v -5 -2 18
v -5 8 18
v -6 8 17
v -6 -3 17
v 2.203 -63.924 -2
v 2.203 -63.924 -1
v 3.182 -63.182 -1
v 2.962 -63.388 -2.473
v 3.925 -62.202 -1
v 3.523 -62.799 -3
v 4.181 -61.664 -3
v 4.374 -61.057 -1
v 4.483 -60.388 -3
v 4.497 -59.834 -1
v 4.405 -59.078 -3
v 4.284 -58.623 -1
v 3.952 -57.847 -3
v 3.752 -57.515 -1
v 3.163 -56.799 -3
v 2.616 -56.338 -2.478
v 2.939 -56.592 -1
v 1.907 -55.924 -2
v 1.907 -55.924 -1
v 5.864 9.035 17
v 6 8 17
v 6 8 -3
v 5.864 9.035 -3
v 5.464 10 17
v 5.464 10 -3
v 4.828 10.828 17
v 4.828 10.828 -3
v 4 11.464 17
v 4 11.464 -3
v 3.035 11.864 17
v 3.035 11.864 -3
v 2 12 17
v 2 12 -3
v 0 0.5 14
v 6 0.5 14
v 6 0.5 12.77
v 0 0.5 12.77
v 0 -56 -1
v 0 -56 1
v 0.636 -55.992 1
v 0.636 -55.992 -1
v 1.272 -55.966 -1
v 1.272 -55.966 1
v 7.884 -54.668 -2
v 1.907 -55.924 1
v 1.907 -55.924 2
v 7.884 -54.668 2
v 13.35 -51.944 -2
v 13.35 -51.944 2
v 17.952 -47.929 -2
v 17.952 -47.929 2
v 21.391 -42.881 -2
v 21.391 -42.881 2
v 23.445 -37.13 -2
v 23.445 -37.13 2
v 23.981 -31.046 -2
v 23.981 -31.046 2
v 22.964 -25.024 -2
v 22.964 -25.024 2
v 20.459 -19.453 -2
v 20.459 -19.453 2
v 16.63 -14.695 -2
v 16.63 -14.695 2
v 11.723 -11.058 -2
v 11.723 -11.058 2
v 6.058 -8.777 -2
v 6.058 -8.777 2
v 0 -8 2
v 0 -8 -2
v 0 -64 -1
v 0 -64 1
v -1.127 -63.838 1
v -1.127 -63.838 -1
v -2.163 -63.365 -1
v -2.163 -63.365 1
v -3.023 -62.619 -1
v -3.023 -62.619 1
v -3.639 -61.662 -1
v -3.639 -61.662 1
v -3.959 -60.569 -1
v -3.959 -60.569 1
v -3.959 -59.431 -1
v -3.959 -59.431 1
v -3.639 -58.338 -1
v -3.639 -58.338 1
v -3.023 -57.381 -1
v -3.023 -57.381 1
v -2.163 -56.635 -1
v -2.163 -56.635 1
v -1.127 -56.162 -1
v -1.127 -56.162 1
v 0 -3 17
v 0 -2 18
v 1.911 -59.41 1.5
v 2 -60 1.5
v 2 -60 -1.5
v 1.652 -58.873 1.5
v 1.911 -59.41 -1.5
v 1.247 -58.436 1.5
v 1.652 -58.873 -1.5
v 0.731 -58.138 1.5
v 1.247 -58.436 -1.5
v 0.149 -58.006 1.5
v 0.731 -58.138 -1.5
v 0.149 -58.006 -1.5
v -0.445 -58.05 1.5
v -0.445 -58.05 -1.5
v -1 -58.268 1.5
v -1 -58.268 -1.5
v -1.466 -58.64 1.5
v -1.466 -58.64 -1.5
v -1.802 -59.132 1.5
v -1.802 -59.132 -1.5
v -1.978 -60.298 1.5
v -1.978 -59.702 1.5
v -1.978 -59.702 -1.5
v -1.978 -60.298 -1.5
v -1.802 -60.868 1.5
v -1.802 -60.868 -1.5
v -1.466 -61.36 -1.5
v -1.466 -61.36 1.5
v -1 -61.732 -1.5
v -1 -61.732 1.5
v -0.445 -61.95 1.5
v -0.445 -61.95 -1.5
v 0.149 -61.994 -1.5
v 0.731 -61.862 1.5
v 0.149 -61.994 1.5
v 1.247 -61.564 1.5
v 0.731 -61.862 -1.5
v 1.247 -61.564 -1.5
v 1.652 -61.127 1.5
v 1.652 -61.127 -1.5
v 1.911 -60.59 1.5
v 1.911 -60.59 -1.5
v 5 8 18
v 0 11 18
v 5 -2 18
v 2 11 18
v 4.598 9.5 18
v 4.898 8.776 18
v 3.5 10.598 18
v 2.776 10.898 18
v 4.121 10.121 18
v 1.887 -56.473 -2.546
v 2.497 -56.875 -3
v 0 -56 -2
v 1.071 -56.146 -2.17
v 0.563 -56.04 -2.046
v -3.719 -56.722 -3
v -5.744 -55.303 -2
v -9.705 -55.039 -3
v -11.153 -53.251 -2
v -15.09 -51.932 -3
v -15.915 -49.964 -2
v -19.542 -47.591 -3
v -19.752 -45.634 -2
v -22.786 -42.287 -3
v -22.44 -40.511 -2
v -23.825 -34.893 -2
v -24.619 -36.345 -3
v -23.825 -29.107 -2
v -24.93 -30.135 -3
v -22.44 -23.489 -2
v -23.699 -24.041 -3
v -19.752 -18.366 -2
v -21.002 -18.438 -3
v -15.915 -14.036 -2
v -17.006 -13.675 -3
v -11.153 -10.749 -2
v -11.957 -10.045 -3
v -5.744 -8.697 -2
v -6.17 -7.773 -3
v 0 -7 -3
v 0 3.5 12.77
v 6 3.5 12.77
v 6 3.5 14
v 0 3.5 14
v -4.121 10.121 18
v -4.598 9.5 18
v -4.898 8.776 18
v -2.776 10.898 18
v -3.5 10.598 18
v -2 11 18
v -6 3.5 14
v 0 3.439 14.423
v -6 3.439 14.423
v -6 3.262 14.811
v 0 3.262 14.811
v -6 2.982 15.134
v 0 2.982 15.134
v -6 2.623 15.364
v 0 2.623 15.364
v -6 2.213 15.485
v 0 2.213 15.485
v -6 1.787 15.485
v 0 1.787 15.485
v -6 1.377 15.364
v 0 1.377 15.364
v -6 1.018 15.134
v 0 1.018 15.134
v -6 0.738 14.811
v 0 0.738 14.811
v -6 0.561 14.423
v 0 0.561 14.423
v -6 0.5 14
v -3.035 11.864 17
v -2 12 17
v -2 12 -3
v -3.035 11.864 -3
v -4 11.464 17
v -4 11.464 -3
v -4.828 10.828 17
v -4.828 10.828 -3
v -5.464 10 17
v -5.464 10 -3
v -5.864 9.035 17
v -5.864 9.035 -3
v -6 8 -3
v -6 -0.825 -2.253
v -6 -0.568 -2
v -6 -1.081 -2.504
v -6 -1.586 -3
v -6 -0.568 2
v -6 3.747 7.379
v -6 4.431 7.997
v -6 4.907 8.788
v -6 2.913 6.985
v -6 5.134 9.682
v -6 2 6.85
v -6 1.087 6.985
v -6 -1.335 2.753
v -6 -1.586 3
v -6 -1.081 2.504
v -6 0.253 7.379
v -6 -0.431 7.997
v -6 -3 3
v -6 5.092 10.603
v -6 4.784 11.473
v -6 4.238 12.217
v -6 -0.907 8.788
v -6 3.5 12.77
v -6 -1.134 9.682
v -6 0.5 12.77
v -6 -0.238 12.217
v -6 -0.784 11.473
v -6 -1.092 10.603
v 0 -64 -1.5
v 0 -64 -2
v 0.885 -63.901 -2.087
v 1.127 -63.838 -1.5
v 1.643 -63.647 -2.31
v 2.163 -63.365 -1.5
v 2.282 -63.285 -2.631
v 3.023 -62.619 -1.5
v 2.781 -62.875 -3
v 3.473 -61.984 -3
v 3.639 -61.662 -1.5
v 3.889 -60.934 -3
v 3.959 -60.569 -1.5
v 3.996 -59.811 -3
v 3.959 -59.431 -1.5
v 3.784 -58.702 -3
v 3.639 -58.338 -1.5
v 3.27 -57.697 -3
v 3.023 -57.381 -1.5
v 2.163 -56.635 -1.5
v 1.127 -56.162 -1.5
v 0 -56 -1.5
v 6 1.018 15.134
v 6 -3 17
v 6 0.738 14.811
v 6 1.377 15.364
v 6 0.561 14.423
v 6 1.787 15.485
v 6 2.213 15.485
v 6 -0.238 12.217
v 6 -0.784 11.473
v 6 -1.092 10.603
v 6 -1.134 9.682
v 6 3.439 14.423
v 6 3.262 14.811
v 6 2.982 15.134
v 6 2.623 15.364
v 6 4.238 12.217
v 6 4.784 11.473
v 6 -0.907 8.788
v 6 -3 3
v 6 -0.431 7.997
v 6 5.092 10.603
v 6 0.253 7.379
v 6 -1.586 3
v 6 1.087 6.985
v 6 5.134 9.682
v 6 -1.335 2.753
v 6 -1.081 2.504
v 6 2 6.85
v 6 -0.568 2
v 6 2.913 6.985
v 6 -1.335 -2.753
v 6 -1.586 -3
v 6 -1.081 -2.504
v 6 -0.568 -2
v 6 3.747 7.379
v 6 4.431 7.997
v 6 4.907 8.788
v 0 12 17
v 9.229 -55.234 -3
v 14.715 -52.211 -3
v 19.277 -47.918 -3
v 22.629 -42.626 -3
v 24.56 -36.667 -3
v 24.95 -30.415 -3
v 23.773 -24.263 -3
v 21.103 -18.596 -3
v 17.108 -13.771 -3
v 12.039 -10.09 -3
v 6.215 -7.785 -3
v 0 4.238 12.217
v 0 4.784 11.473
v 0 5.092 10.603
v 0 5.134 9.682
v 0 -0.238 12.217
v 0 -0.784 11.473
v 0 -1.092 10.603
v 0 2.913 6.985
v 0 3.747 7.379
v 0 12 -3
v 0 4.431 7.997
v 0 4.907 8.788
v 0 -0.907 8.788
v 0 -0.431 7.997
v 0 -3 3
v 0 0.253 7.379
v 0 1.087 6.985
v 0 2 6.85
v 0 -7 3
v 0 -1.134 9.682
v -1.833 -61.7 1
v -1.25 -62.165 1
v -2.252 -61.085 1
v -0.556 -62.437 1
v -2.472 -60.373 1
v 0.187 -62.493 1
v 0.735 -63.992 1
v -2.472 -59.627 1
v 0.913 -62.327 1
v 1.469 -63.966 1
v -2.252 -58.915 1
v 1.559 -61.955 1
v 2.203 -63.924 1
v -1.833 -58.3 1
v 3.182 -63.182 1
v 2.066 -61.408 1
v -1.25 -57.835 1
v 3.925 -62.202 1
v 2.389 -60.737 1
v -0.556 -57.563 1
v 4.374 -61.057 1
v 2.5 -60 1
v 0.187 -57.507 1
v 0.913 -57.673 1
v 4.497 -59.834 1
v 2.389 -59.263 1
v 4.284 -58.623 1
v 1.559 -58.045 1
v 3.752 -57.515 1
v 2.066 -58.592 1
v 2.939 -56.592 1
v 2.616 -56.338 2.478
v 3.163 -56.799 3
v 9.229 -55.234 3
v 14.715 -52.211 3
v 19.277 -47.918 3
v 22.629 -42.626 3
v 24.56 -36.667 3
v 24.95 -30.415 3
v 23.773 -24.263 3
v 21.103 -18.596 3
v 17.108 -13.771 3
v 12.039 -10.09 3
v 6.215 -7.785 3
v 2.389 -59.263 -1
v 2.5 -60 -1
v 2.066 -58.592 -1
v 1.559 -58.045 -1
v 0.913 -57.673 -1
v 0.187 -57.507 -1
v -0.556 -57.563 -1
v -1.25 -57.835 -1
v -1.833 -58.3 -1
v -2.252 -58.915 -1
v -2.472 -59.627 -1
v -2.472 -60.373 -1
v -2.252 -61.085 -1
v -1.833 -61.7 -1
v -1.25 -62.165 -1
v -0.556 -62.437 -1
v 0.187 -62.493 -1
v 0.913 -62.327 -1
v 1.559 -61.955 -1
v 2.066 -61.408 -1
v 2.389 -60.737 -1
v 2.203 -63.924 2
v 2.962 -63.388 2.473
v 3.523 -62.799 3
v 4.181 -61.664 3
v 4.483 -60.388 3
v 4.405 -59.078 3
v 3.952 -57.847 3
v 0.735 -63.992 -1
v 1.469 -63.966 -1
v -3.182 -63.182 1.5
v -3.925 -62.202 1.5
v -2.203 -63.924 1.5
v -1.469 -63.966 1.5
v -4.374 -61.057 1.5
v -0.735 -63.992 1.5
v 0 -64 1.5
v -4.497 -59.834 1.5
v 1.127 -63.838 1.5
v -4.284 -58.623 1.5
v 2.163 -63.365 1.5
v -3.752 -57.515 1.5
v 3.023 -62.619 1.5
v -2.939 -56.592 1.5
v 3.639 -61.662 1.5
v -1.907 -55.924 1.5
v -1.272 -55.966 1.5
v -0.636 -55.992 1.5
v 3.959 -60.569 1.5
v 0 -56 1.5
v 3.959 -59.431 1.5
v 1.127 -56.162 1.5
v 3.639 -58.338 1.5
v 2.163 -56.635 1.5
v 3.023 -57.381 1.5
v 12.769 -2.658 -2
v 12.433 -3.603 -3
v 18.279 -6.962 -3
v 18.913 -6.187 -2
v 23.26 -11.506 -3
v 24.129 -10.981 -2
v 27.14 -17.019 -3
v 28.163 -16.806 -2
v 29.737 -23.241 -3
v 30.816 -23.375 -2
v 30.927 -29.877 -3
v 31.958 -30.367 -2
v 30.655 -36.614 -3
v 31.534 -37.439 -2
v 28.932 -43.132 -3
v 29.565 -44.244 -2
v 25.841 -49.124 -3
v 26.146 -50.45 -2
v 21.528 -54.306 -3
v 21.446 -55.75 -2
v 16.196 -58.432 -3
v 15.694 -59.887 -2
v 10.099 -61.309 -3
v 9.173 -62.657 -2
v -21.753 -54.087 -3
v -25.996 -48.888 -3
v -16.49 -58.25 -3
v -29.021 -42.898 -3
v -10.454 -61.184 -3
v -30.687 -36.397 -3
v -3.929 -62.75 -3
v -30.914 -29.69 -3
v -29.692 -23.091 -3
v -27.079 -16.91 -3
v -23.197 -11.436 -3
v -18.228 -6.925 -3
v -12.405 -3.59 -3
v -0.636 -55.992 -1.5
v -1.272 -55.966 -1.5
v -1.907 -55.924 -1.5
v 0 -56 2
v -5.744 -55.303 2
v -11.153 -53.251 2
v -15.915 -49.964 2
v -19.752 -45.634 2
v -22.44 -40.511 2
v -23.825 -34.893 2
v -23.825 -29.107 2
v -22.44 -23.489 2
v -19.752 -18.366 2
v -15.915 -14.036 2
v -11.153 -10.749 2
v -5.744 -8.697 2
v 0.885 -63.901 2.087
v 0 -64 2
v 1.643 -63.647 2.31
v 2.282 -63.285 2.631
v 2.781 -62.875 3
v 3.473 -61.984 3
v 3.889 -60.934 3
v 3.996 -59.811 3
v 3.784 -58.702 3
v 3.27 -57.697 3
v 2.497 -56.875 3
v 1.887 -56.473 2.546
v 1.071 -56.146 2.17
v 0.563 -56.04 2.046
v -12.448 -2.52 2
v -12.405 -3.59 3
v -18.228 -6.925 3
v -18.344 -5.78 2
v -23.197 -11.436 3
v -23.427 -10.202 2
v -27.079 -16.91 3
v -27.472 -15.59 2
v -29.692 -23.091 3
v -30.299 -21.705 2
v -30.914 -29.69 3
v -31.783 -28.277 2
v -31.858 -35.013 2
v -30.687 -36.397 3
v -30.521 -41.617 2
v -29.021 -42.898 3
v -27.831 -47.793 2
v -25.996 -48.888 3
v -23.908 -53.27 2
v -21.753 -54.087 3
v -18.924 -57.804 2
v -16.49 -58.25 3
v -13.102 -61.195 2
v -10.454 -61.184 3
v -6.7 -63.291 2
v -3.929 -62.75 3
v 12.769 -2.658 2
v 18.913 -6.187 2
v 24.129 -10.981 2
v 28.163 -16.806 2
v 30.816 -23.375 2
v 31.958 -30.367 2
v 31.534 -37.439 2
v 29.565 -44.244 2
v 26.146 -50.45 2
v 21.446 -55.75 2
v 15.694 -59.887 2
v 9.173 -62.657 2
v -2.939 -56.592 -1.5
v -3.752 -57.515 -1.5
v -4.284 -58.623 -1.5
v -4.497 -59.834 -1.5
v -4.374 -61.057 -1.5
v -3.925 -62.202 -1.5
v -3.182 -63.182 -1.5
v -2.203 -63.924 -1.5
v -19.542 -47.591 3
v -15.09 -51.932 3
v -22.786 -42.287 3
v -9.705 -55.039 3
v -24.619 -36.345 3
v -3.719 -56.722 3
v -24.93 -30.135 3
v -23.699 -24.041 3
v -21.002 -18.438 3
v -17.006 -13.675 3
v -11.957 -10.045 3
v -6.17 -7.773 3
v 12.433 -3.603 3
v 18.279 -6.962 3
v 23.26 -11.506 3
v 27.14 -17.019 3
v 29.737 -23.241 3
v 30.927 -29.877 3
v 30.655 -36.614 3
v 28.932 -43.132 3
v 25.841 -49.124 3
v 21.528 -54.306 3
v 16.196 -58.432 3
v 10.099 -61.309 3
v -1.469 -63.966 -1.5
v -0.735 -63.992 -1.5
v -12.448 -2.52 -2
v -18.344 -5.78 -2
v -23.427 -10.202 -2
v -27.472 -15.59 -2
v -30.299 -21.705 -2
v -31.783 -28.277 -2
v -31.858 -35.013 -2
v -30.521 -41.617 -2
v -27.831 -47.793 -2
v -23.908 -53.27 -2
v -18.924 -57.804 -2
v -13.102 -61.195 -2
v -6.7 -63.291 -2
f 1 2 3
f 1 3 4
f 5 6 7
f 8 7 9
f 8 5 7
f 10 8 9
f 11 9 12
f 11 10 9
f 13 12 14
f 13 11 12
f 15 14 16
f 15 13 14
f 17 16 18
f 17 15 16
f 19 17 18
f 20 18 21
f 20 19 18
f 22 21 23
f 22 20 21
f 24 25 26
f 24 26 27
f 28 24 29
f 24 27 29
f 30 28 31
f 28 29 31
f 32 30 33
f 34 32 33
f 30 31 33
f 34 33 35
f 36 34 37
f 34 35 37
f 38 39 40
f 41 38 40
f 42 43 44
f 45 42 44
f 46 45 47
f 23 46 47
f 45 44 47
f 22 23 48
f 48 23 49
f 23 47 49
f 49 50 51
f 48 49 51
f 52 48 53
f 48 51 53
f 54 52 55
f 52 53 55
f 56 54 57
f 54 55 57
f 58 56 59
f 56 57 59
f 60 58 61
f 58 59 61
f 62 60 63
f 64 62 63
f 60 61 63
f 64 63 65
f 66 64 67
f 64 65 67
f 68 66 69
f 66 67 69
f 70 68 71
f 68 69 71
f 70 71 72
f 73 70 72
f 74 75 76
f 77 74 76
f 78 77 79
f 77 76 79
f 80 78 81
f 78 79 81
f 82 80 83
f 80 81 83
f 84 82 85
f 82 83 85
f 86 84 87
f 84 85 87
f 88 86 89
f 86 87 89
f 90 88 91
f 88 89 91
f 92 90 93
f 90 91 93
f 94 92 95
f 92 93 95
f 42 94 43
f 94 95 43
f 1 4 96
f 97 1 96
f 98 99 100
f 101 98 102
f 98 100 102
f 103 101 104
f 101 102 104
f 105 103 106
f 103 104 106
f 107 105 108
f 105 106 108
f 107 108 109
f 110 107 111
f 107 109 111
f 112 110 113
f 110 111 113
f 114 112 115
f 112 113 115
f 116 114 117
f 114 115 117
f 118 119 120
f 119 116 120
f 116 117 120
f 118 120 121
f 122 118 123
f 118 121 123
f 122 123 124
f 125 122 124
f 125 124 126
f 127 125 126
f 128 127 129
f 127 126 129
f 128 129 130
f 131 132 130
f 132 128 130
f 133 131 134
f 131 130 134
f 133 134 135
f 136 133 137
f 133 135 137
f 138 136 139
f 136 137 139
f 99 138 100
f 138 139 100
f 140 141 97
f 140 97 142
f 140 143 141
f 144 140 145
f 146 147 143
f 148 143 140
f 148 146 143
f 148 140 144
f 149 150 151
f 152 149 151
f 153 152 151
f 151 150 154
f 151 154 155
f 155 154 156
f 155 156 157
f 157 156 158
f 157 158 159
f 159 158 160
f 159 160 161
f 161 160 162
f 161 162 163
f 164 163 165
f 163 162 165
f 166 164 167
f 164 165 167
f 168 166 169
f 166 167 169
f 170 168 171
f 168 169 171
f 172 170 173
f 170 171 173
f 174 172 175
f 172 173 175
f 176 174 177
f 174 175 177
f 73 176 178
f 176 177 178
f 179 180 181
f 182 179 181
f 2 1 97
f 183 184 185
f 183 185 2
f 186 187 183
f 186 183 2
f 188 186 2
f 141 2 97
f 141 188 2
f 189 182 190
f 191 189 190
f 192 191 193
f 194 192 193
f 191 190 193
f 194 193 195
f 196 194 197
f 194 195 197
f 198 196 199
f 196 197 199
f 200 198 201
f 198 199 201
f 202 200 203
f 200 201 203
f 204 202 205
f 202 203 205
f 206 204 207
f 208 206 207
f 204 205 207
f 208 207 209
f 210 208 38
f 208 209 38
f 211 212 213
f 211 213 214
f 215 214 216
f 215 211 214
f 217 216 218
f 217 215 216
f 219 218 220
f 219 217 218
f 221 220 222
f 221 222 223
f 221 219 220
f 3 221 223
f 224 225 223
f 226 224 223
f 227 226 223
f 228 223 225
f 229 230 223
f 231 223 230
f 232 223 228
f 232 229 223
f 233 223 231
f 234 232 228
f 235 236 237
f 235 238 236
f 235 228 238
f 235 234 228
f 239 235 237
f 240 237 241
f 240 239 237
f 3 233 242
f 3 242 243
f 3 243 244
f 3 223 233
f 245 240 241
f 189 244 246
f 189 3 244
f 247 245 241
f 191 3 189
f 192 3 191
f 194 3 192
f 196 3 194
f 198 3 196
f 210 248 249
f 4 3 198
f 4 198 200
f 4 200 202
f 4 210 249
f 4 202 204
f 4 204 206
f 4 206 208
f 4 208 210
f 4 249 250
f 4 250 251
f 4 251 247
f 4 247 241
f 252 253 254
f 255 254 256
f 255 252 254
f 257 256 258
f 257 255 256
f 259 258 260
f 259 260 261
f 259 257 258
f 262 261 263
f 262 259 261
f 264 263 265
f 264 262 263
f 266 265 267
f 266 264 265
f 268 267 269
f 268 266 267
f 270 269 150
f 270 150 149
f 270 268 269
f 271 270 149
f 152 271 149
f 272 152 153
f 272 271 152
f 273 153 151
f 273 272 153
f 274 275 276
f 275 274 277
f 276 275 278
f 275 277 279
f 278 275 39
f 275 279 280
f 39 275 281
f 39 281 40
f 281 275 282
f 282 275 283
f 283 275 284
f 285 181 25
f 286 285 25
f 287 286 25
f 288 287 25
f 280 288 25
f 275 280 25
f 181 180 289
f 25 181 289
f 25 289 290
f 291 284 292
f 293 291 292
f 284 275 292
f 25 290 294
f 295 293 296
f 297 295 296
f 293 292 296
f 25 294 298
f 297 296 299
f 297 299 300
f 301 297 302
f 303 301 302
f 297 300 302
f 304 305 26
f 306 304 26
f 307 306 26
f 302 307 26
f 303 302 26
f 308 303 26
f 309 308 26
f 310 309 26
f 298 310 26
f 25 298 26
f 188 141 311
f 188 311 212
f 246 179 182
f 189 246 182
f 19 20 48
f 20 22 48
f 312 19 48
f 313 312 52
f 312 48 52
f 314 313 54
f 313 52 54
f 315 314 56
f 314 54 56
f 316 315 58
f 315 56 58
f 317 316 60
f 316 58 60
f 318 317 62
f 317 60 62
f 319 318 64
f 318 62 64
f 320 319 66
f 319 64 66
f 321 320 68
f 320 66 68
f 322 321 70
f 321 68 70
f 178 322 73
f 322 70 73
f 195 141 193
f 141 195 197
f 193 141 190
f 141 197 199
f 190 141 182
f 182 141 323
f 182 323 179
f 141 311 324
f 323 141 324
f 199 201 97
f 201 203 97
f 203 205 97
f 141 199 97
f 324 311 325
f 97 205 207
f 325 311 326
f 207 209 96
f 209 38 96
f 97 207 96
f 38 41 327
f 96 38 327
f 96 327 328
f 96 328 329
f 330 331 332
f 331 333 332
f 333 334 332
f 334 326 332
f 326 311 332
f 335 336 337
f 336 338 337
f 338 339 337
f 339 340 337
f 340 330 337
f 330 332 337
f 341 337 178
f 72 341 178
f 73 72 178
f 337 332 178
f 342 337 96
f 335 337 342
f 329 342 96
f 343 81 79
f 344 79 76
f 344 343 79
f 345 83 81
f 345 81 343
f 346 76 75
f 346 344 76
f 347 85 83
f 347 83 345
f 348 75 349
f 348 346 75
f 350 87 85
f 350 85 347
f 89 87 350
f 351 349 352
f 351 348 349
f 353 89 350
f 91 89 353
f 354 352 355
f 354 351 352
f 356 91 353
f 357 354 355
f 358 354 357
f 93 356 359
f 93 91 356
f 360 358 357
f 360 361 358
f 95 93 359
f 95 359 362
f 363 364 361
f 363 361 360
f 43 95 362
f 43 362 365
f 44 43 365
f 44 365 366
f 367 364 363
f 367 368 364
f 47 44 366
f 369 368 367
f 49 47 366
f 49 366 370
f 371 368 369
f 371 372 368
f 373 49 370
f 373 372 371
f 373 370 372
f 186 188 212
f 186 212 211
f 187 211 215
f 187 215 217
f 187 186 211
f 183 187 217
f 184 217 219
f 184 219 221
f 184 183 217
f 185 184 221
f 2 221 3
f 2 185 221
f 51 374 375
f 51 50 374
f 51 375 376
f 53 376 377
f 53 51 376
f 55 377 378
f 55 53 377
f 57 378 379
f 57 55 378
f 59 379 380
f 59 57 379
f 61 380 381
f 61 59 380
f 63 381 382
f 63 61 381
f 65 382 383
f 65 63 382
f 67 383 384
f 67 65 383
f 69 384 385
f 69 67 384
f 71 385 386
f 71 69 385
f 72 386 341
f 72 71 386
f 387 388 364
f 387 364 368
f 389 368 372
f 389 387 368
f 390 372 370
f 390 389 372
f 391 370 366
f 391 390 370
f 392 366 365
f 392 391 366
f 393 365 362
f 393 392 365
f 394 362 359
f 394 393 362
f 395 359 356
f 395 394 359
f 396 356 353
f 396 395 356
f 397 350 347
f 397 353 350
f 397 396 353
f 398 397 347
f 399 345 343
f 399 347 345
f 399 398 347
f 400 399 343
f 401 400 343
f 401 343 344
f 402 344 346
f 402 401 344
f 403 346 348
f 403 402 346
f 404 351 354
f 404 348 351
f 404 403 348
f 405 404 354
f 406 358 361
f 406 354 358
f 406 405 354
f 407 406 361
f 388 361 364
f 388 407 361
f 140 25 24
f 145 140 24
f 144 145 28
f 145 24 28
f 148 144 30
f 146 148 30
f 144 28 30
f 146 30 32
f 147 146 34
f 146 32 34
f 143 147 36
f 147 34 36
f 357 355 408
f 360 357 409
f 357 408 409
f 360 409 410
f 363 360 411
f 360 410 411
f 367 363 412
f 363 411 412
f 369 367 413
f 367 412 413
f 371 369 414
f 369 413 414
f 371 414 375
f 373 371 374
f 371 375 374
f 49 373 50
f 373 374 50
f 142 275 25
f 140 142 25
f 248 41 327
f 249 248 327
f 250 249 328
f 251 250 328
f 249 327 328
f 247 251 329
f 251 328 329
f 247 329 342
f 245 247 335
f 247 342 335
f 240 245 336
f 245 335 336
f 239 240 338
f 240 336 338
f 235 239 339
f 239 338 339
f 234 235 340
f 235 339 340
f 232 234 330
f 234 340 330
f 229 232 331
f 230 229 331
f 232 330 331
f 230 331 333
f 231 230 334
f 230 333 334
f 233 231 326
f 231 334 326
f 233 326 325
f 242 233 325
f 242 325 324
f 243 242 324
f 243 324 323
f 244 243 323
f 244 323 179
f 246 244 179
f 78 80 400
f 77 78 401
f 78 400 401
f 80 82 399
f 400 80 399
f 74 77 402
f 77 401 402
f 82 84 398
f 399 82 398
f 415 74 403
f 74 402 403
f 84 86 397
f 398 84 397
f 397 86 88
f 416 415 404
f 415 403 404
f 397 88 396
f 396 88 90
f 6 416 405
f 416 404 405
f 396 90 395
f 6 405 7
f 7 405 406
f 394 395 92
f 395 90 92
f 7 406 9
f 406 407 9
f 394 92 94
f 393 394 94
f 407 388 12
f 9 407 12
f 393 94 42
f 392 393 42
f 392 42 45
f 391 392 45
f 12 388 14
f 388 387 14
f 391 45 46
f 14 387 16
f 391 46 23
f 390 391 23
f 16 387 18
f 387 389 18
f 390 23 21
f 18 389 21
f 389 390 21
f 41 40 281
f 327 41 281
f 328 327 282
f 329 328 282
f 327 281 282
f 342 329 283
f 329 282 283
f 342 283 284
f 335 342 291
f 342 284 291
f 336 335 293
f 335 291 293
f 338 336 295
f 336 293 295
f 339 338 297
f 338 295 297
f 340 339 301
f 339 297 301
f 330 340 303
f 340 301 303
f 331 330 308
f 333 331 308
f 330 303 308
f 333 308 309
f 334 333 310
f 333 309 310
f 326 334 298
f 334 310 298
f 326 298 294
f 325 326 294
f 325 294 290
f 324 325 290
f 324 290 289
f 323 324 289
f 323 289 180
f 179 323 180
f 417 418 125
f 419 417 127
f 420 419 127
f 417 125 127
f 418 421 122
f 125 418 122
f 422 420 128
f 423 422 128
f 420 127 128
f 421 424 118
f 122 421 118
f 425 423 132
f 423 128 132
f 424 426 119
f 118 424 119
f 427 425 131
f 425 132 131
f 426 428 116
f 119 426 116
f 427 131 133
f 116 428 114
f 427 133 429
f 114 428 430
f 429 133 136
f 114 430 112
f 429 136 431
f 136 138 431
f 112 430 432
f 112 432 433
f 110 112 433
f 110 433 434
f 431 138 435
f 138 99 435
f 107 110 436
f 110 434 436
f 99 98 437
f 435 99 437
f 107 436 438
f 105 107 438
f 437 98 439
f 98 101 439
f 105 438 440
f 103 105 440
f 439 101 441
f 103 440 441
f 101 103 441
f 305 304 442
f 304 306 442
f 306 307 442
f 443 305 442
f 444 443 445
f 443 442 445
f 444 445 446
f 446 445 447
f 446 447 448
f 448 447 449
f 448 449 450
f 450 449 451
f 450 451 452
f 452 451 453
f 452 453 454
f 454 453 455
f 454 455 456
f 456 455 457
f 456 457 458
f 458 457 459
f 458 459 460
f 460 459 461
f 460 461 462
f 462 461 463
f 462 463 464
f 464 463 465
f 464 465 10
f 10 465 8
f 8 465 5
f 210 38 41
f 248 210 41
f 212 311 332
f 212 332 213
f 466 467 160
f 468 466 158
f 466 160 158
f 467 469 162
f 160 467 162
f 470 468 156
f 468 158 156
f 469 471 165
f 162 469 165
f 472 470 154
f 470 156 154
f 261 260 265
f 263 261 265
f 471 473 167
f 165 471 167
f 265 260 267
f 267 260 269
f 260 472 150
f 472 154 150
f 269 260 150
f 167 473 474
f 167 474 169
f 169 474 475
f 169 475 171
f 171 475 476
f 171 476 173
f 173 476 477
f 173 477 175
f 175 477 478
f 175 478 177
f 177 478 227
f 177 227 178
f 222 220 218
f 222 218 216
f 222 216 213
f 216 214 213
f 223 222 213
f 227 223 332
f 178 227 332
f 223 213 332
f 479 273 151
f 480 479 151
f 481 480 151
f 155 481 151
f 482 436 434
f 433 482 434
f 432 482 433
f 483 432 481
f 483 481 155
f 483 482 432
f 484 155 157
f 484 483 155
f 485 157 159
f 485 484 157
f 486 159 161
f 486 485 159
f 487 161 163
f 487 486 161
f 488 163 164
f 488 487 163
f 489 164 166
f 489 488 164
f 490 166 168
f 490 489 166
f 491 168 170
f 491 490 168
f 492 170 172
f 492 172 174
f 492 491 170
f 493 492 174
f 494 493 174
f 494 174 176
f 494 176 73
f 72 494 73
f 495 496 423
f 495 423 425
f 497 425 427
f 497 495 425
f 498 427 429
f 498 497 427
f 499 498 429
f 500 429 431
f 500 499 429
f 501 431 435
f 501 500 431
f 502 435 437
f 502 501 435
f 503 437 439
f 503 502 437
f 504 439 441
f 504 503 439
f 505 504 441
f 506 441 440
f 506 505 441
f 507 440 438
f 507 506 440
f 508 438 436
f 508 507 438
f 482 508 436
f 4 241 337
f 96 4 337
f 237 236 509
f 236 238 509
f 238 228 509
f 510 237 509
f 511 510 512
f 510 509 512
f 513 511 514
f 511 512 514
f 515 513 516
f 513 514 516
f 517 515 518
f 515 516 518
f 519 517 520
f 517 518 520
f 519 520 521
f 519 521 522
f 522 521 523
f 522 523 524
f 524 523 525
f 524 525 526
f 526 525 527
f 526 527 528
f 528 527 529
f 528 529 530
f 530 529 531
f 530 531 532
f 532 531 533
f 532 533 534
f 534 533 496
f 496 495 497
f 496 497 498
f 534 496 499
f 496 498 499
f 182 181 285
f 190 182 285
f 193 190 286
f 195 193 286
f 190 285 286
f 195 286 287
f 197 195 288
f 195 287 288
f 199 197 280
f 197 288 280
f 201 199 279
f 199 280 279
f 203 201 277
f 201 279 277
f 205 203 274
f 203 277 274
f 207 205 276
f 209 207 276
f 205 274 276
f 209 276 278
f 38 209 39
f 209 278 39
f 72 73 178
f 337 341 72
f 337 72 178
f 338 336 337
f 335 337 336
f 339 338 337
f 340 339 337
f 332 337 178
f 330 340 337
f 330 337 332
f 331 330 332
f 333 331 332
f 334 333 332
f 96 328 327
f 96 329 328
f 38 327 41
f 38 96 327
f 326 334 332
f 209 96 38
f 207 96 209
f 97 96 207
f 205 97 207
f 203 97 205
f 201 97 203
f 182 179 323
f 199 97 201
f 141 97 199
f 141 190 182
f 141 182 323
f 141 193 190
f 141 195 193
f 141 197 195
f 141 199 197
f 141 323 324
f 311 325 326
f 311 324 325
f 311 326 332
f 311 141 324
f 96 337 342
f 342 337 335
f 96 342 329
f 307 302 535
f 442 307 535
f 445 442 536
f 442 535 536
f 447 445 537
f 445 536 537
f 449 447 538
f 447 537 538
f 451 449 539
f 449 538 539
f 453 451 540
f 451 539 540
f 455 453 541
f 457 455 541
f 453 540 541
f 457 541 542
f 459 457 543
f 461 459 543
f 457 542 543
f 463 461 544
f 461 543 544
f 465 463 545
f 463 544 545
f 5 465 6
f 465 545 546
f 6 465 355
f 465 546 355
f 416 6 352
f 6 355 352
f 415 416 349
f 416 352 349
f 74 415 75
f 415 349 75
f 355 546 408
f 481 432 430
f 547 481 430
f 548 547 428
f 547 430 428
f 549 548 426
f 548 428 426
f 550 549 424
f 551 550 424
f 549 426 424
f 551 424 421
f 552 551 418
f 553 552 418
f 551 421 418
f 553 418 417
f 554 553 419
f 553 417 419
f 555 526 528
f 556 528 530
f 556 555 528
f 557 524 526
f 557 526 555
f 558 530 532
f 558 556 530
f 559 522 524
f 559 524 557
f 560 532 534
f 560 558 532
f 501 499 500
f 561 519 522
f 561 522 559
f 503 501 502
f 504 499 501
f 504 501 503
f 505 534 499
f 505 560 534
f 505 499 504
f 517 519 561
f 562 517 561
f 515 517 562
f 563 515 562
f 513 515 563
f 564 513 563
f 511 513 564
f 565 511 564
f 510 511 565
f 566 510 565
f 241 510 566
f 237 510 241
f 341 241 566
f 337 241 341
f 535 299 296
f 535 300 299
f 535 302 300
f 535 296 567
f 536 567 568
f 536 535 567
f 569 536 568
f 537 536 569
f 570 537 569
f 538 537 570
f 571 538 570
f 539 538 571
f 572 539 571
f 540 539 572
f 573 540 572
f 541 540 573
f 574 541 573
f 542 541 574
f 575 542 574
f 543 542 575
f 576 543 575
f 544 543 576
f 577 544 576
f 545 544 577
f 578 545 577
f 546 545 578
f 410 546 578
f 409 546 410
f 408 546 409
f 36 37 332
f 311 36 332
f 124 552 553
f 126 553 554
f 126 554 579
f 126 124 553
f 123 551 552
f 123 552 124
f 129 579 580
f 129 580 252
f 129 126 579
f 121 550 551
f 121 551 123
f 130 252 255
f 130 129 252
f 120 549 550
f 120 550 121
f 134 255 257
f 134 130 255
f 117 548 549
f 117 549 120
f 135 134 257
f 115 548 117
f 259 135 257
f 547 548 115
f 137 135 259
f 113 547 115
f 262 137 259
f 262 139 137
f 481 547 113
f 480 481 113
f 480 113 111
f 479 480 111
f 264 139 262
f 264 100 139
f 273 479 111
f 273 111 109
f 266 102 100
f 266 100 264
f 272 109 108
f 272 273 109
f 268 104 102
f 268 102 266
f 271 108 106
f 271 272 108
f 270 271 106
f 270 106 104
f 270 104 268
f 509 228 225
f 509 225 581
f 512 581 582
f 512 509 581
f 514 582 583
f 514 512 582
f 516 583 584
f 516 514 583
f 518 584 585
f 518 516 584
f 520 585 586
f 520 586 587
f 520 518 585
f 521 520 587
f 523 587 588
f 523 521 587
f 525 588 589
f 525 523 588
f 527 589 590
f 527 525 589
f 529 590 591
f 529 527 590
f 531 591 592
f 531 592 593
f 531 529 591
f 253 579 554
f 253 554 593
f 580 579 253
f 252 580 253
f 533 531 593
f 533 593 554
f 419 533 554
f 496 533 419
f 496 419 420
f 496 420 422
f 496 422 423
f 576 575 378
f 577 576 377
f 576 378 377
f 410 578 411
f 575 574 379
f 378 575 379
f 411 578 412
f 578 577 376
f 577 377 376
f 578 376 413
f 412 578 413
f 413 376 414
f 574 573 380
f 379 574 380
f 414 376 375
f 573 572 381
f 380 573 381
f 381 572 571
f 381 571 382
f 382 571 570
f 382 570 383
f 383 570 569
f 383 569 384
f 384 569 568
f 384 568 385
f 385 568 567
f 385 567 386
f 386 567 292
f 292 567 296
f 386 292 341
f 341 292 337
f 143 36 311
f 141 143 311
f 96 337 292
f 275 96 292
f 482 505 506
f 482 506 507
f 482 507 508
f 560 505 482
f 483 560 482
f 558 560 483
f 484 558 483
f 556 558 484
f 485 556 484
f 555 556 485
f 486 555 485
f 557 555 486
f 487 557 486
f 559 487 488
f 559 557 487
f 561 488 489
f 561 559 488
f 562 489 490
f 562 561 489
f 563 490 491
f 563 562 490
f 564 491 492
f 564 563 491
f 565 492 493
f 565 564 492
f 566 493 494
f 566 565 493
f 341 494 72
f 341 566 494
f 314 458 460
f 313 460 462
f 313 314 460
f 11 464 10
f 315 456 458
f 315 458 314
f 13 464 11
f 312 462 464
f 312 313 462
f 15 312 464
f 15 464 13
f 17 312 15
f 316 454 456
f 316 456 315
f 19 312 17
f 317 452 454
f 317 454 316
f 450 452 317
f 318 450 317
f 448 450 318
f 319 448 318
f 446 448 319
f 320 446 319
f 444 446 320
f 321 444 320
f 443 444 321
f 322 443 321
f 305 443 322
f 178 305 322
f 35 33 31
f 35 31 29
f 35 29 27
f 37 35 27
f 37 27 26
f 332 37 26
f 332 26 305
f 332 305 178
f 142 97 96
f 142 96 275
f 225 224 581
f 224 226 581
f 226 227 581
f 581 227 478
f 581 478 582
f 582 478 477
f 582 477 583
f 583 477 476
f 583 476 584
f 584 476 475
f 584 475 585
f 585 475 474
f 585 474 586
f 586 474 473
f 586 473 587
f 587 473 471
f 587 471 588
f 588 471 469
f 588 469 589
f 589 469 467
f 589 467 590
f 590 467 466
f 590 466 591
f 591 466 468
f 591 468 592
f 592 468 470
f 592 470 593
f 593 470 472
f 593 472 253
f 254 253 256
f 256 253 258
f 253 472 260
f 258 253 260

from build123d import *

# Parameters (mm, degrees)
AUFSATZ_LINEAR_AUSTRAGEN1_DEPTH             = 3
SKIZZE2_R                                   = 4.5
SCHNITT_LINEAR_AUSTRAGEN1_DEPTH             = 1.5
AUFSATZ_LINEAR_AUSTRAGEN2_REACH             = 73.617
SKIZZE3_R                                   = 2
AUFSATZ_LINEAR_AUSTRAGEN2_DIRECTION_2_REACH = 73.617
SKIZZE4_R                                   = 2.5
AUFSATZ_LINEAR_AUSTRAGEN4_DEPTH             = 3
SKIZZE5_R                                   = 4.5
SCHNITT_LINEAR_AUSTRAGEN2_DEPTH             = 2
AUFSATZ_LINEAR_START                        = -6
AUFSATZ_LINEAR_AUSTRAGEN5_DEPTH             = 6
AUFSATZ_LINEAR_AUSTRAGEN6_DEPTH             = 6
AUFSATZ_LINEAR_AUSTRAGEN7_DEPTH             = 15
AUFSATZ_LINEAR_START_2                      = 15
AUFSATZ_LINEAR_AUSTRAGEN9_DEPTH             = 15
SCHNITT_LINEAR_AUSTRAGEN3_DEPTH             = 6.5
FASE1_SIZE                                  = 1
FASE2_SIZE                                  = 1
FASE3_SIZE                                  = 1
FASE4_START                                 = -3
FASE4_2_DEPTH                               = 6
FASE5_SIZE                                  = 1
FASE6_SIZE                                  = 1


with BuildPart() as part:
    # Skizze1 → Aufsatz-Linear austragen1 (new, symmetric)
    with BuildSketch(Plane.XY):
        with BuildLine():
            Line((0, -8), (0, 0))
            ThreePointArc((0, 0), (-32, -32), (0, -64))
            ThreePointArc((0, -64), (4, -60), (0, -56))
            ThreePointArc((0, -56), (-24, -32), (0, -8))
        make_face()
    extrude(amount=AUFSATZ_LINEAR_AUSTRAGEN1_DEPTH, both=True)

    # Skizze2 → Schnitt-Linear austragen1 (cut, symmetric)
    with BuildSketch(Plane.XY):
        with Locations((0, -60)):
            Circle(SKIZZE2_R)
    extrude(amount=SCHNITT_LINEAR_AUSTRAGEN1_DEPTH, both=True, mode=Mode.SUBTRACT)

    # Aufsatz-Linear austragen2: up to this face of the body (flat: up to its plane)
    aufsatz_linear_austragen2_end = Plane(part.part.faces().sort_by_distance((-0.306004635, -59.992467517, 1.5))[0])
    # Skizze3 → Aufsatz-Linear austragen2 (add, up to the picked face)
    with BuildSketch(Plane.XY, mode=Mode.PRIVATE) as aufsatz_linear_austragen2_sk1:
        with Locations((0, -60)):
            Circle(SKIZZE3_R)
    aufsatz_linear_austragen2_tool1 = split(extrude(aufsatz_linear_austragen2_sk1.sketch, amount=AUFSATZ_LINEAR_AUSTRAGEN2_REACH, mode=Mode.PRIVATE), bisect_by=aufsatz_linear_austragen2_end, keep=Keep.BOTH, mode=Mode.PRIVATE)
    add(aufsatz_linear_austragen2_tool1.solids().sort_by(Axis((0, -60, 0), (0, 0, 1)))[0])

    # Aufsatz-Linear austragen2 direction 2: up to this face of the body (flat: up to its plane)
    aufsatz_linear_austragen2_direction_2_end = Plane(part.part.faces().sort_by_distance((-0.306004635, -59.992467517, -1.5))[0])
    # Skizze3 → Aufsatz-Linear austragen2 direction 2 (add, up to the picked face)
    with BuildSketch(Plane.XY, mode=Mode.PRIVATE) as aufsatz_linear_austragen2_direction_2_sk1:
        with Locations((0, -60)):
            Circle(SKIZZE3_R)
    aufsatz_linear_austragen2_direction_2_tool1 = split(extrude(aufsatz_linear_austragen2_direction_2_sk1.sketch, amount=-AUFSATZ_LINEAR_AUSTRAGEN2_DIRECTION_2_REACH, mode=Mode.PRIVATE), bisect_by=aufsatz_linear_austragen2_direction_2_end, keep=Keep.BOTH, mode=Mode.PRIVATE)
    add(aufsatz_linear_austragen2_direction_2_tool1.solids().sort_by(Axis((0, -60, 0), (0, 0, -1)))[0])

    # Skizze7 → Aufsatz-Linear austragen6 (add)
    with BuildSketch(Plane(origin=(0, 0, -3), x_dir=(-1, 0, 0), z_dir=(0, 0, -1)).offset(AUFSATZ_LINEAR_START)):
        with BuildLine():
            Line((0, 0), (0, 12))
            Line((0, 12), (2, 12))
            ThreePointArc((2, 12), (4.828427125, 10.828427125), (6, 8))
            Line((6, 8), (6, -0.567532709))
            ThreePointArc((6, -0.567532709), (3.013390672, -0.142199124), (0, 0))
        make_face()
    extrude(amount=AUFSATZ_LINEAR_AUSTRAGEN6_DEPTH)

    # Skizze9 → Aufsatz-Linear austragen9 (add)
    with BuildSketch(Plane.XY.offset(3).offset(AUFSATZ_LINEAR_START_2)):
        with BuildLine():
            Line((-6, -3), (0, -3))
            Line((0, -3), (0, 12))
            Line((0, 12), (-2, 12))
            ThreePointArc((-2, 12), (-4.828427125, 10.828427125), (-6, 8))
            Line((-6, 8), (-6, -0.567532709))
            Line((-6, -0.567532709), (-6, -3))
        make_face()
    extrude(amount=-AUFSATZ_LINEAR_AUSTRAGEN9_DEPTH)


with BuildPart() as body_2:
    # Skizze4 → Aufsatz-Linear austragen4 (new, symmetric)
    with BuildSketch(Plane.XY):
        with BuildLine():
            Line((0, -8), (0, 0))
            ThreePointArc((0, 0), (32, -32), (0, -64))
            ThreePointArc((0, -64), (-4, -60), (0, -56))
            ThreePointArc((0, -56), (24, -32), (0, -8))
        make_face()
        with Locations((0, -60)):
            Circle(SKIZZE4_R, mode=Mode.SUBTRACT)
    extrude(amount=AUFSATZ_LINEAR_AUSTRAGEN4_DEPTH, both=True)

    # Skizze5 → Schnitt-Linear austragen2 (cut)
    with BuildSketch(Plane.XY.offset(3)):
        with Locations((0, -60)):
            Circle(SKIZZE5_R)
    schnitt_linear_austragen2 = extrude(amount=-SCHNITT_LINEAR_AUSTRAGEN2_DEPTH, mode=Mode.SUBTRACT)

    # Spiegeln1: Schnitt-Linear austragen2 across plane
    add(schnitt_linear_austragen2.mirror(Plane.XY), mode=Mode.SUBTRACT)

    # Skizze6 → Aufsatz-Linear austragen5 (add)
    with BuildSketch(Plane(origin=(0, 0, -3), x_dir=(-1, 0, 0), z_dir=(0, 0, -1)).offset(AUFSATZ_LINEAR_START)):
        with BuildLine():
            Line((0, 0), (0, 12))
            Line((0, 12), (-2, 12))
            ThreePointArc((-2, 12), (-4.828427125, 10.828427125), (-6, 8))
            Line((-6, 8), (-6, -0.567532709))
            ThreePointArc((-6, -0.567532709), (-3.013390672, -0.142199124), (0, 0))
        make_face()
    extrude(amount=AUFSATZ_LINEAR_AUSTRAGEN5_DEPTH)

    # Skizze8 → Aufsatz-Linear austragen7 (add)
    with BuildSketch(Plane.XY.offset(3)):
        with BuildLine():
            Line((0, -3), (6, -3))
            Line((6, -3), (6, 8))
            ThreePointArc((6, 8), (4.828427125, 10.828427125), (2, 12))
            Line((2, 12), (0, 12))
            Line((0, 12), (0, -3))
        make_face()
    extrude(amount=AUFSATZ_LINEAR_AUSTRAGEN7_DEPTH)


with BuildPart() as schnitt_linear_austragen3_tool:
    # Skizze10 → Schnitt-Linear austragen3 (new, symmetric)
    with BuildSketch(Plane(origin=(0, 0, 0), x_dir=(0, 0, -1), z_dir=(1, 0, 0))):
        with BuildLine():
            Line((-14, 0.5), (-12.769927797, 0.5))
            ThreePointArc((-12.769927797, 0.5), (-6.85, 2), (-12.769927797, 3.5))
            Line((-12.769927797, 3.5), (-14, 3.5))
            ThreePointArc((-14, 3.5), (-15.5, 2), (-14, 0.5))
        make_face()
    extrude(amount=SCHNITT_LINEAR_AUSTRAGEN3_DEPTH, both=True)


with BuildPart() as part_1:
    add(part.part)

    # Schnitt-Linear austragen3: cut by schnitt_linear_austragen3_tool
    add(schnitt_linear_austragen3_tool.part, mode=Mode.SUBTRACT)

    # Fase2
    # the kernel refuses this chamfer: 1 mm, written as the material it takes off along each edge
    with BuildSketch(Plane(origin=(0, -32, 3), x_dir=(0.10711985504033346, -0.9942461147302201, 0), z_dir=(0.9942461147302201, 0.10711985504033346, 0))) as fase2_piece_1:
        Polygon((24, FASE2_SIZE), (24 + FASE2_SIZE, 0), (24, 0), align=None)
    revolve(axis=Axis((0, -32, 3), (0, 0, -1)), revolution_arc=192.298628552, mode=Mode.SUBTRACT)
    with BuildSketch(Plane(origin=(0, -32, -3), x_dir=(0.10711985504033346, -0.9942461147302201, 0), z_dir=(0.9942461147302201, 0.10711985504033346, 0))) as fase2_piece_2:
        Polygon((24, -FASE2_SIZE), (24 + FASE2_SIZE, 0), (24, 0), align=None)
    revolve(axis=Axis((0, -32, -3), (0, 0, -1)), revolution_arc=192.298628552, mode=Mode.SUBTRACT)

    # Fase4: read off the stored shape, not the designer's step
    # Fase4 outline → Fase4 (revolve, cut)
    with BuildSketch(Plane.XZ.offset(32)):
        Polygon((32.000006898, 3), (31, 3), (32.000006898, 1.999993102), align=None)
        Polygon((32.000006898, -3), (32.000006898, -1.999994955), (31, -3), align=None)
    revolve(axis=Axis((0, -32, 0), (0, 0, 1)), mode=Mode.SUBTRACT)

    # Fase4 2 outline → Fase4 2 (add)
    with BuildSketch(Plane.XY.offset(FASE4_START)):
        with BuildLine():
            Line((0, -1), (0, 6.898e-06))
            ThreePointArc((0, 6.898e-06), (-3.013390666, -0.142192195), (-6, -0.567525686))
            Line((-6, -0.567525686), (-6, -1.586187349))
            ThreePointArc((-6, -1.586187349), (-3.014283315, -1.146894871), (0, -1))
        make_face()
    extrude(amount=FASE4_2_DEPTH)

    # Fase6
    fase6_edges = [part_1.edges().sort_by_distance(p)[0] for p in [
        (-3, -3, 18),
        (-4.828427125, 10.828427125, 18),
        (-6, 2.5, 18),
        (-1, 12, 18),
    ]]
    chamfer(fase6_edges, length=FASE6_SIZE)


with BuildPart() as body_2_1:
    add(body_2.part)

    # Schnitt-Linear austragen3: cut by schnitt_linear_austragen3_tool
    add(schnitt_linear_austragen3_tool.part, mode=Mode.SUBTRACT)

    # Fase1
    fase1_edges = [body_2_1.edges().sort_by_distance(p)[0] for p in [
        (23.98101928, -31.045686485, 3),
        (23.98101928, -31.045686485, -3),
    ]]
    chamfer(fase1_edges, length=FASE1_SIZE)

    # Fase3
    fase3_edges = [body_2_1.edges().sort_by_distance(p)[0] for p in [
        (31.942674958, -33.914553878, 3),
        (31.942674958, -33.914553878, -3),
    ]]
    chamfer(fase3_edges, length=FASE3_SIZE)

    # Fase5
    fase5_edges = [body_2_1.edges().sort_by_distance(p)[0] for p in [
        (3, -3, 18),
        (6, 2.5, 18),
        (4.828427125, 10.828427125, 18),
        (1, 12, 18),
    ]]
    chamfer(fase5_edges, length=FASE5_SIZE)


solid = Compound([part_1.part, body_2_1.part])
